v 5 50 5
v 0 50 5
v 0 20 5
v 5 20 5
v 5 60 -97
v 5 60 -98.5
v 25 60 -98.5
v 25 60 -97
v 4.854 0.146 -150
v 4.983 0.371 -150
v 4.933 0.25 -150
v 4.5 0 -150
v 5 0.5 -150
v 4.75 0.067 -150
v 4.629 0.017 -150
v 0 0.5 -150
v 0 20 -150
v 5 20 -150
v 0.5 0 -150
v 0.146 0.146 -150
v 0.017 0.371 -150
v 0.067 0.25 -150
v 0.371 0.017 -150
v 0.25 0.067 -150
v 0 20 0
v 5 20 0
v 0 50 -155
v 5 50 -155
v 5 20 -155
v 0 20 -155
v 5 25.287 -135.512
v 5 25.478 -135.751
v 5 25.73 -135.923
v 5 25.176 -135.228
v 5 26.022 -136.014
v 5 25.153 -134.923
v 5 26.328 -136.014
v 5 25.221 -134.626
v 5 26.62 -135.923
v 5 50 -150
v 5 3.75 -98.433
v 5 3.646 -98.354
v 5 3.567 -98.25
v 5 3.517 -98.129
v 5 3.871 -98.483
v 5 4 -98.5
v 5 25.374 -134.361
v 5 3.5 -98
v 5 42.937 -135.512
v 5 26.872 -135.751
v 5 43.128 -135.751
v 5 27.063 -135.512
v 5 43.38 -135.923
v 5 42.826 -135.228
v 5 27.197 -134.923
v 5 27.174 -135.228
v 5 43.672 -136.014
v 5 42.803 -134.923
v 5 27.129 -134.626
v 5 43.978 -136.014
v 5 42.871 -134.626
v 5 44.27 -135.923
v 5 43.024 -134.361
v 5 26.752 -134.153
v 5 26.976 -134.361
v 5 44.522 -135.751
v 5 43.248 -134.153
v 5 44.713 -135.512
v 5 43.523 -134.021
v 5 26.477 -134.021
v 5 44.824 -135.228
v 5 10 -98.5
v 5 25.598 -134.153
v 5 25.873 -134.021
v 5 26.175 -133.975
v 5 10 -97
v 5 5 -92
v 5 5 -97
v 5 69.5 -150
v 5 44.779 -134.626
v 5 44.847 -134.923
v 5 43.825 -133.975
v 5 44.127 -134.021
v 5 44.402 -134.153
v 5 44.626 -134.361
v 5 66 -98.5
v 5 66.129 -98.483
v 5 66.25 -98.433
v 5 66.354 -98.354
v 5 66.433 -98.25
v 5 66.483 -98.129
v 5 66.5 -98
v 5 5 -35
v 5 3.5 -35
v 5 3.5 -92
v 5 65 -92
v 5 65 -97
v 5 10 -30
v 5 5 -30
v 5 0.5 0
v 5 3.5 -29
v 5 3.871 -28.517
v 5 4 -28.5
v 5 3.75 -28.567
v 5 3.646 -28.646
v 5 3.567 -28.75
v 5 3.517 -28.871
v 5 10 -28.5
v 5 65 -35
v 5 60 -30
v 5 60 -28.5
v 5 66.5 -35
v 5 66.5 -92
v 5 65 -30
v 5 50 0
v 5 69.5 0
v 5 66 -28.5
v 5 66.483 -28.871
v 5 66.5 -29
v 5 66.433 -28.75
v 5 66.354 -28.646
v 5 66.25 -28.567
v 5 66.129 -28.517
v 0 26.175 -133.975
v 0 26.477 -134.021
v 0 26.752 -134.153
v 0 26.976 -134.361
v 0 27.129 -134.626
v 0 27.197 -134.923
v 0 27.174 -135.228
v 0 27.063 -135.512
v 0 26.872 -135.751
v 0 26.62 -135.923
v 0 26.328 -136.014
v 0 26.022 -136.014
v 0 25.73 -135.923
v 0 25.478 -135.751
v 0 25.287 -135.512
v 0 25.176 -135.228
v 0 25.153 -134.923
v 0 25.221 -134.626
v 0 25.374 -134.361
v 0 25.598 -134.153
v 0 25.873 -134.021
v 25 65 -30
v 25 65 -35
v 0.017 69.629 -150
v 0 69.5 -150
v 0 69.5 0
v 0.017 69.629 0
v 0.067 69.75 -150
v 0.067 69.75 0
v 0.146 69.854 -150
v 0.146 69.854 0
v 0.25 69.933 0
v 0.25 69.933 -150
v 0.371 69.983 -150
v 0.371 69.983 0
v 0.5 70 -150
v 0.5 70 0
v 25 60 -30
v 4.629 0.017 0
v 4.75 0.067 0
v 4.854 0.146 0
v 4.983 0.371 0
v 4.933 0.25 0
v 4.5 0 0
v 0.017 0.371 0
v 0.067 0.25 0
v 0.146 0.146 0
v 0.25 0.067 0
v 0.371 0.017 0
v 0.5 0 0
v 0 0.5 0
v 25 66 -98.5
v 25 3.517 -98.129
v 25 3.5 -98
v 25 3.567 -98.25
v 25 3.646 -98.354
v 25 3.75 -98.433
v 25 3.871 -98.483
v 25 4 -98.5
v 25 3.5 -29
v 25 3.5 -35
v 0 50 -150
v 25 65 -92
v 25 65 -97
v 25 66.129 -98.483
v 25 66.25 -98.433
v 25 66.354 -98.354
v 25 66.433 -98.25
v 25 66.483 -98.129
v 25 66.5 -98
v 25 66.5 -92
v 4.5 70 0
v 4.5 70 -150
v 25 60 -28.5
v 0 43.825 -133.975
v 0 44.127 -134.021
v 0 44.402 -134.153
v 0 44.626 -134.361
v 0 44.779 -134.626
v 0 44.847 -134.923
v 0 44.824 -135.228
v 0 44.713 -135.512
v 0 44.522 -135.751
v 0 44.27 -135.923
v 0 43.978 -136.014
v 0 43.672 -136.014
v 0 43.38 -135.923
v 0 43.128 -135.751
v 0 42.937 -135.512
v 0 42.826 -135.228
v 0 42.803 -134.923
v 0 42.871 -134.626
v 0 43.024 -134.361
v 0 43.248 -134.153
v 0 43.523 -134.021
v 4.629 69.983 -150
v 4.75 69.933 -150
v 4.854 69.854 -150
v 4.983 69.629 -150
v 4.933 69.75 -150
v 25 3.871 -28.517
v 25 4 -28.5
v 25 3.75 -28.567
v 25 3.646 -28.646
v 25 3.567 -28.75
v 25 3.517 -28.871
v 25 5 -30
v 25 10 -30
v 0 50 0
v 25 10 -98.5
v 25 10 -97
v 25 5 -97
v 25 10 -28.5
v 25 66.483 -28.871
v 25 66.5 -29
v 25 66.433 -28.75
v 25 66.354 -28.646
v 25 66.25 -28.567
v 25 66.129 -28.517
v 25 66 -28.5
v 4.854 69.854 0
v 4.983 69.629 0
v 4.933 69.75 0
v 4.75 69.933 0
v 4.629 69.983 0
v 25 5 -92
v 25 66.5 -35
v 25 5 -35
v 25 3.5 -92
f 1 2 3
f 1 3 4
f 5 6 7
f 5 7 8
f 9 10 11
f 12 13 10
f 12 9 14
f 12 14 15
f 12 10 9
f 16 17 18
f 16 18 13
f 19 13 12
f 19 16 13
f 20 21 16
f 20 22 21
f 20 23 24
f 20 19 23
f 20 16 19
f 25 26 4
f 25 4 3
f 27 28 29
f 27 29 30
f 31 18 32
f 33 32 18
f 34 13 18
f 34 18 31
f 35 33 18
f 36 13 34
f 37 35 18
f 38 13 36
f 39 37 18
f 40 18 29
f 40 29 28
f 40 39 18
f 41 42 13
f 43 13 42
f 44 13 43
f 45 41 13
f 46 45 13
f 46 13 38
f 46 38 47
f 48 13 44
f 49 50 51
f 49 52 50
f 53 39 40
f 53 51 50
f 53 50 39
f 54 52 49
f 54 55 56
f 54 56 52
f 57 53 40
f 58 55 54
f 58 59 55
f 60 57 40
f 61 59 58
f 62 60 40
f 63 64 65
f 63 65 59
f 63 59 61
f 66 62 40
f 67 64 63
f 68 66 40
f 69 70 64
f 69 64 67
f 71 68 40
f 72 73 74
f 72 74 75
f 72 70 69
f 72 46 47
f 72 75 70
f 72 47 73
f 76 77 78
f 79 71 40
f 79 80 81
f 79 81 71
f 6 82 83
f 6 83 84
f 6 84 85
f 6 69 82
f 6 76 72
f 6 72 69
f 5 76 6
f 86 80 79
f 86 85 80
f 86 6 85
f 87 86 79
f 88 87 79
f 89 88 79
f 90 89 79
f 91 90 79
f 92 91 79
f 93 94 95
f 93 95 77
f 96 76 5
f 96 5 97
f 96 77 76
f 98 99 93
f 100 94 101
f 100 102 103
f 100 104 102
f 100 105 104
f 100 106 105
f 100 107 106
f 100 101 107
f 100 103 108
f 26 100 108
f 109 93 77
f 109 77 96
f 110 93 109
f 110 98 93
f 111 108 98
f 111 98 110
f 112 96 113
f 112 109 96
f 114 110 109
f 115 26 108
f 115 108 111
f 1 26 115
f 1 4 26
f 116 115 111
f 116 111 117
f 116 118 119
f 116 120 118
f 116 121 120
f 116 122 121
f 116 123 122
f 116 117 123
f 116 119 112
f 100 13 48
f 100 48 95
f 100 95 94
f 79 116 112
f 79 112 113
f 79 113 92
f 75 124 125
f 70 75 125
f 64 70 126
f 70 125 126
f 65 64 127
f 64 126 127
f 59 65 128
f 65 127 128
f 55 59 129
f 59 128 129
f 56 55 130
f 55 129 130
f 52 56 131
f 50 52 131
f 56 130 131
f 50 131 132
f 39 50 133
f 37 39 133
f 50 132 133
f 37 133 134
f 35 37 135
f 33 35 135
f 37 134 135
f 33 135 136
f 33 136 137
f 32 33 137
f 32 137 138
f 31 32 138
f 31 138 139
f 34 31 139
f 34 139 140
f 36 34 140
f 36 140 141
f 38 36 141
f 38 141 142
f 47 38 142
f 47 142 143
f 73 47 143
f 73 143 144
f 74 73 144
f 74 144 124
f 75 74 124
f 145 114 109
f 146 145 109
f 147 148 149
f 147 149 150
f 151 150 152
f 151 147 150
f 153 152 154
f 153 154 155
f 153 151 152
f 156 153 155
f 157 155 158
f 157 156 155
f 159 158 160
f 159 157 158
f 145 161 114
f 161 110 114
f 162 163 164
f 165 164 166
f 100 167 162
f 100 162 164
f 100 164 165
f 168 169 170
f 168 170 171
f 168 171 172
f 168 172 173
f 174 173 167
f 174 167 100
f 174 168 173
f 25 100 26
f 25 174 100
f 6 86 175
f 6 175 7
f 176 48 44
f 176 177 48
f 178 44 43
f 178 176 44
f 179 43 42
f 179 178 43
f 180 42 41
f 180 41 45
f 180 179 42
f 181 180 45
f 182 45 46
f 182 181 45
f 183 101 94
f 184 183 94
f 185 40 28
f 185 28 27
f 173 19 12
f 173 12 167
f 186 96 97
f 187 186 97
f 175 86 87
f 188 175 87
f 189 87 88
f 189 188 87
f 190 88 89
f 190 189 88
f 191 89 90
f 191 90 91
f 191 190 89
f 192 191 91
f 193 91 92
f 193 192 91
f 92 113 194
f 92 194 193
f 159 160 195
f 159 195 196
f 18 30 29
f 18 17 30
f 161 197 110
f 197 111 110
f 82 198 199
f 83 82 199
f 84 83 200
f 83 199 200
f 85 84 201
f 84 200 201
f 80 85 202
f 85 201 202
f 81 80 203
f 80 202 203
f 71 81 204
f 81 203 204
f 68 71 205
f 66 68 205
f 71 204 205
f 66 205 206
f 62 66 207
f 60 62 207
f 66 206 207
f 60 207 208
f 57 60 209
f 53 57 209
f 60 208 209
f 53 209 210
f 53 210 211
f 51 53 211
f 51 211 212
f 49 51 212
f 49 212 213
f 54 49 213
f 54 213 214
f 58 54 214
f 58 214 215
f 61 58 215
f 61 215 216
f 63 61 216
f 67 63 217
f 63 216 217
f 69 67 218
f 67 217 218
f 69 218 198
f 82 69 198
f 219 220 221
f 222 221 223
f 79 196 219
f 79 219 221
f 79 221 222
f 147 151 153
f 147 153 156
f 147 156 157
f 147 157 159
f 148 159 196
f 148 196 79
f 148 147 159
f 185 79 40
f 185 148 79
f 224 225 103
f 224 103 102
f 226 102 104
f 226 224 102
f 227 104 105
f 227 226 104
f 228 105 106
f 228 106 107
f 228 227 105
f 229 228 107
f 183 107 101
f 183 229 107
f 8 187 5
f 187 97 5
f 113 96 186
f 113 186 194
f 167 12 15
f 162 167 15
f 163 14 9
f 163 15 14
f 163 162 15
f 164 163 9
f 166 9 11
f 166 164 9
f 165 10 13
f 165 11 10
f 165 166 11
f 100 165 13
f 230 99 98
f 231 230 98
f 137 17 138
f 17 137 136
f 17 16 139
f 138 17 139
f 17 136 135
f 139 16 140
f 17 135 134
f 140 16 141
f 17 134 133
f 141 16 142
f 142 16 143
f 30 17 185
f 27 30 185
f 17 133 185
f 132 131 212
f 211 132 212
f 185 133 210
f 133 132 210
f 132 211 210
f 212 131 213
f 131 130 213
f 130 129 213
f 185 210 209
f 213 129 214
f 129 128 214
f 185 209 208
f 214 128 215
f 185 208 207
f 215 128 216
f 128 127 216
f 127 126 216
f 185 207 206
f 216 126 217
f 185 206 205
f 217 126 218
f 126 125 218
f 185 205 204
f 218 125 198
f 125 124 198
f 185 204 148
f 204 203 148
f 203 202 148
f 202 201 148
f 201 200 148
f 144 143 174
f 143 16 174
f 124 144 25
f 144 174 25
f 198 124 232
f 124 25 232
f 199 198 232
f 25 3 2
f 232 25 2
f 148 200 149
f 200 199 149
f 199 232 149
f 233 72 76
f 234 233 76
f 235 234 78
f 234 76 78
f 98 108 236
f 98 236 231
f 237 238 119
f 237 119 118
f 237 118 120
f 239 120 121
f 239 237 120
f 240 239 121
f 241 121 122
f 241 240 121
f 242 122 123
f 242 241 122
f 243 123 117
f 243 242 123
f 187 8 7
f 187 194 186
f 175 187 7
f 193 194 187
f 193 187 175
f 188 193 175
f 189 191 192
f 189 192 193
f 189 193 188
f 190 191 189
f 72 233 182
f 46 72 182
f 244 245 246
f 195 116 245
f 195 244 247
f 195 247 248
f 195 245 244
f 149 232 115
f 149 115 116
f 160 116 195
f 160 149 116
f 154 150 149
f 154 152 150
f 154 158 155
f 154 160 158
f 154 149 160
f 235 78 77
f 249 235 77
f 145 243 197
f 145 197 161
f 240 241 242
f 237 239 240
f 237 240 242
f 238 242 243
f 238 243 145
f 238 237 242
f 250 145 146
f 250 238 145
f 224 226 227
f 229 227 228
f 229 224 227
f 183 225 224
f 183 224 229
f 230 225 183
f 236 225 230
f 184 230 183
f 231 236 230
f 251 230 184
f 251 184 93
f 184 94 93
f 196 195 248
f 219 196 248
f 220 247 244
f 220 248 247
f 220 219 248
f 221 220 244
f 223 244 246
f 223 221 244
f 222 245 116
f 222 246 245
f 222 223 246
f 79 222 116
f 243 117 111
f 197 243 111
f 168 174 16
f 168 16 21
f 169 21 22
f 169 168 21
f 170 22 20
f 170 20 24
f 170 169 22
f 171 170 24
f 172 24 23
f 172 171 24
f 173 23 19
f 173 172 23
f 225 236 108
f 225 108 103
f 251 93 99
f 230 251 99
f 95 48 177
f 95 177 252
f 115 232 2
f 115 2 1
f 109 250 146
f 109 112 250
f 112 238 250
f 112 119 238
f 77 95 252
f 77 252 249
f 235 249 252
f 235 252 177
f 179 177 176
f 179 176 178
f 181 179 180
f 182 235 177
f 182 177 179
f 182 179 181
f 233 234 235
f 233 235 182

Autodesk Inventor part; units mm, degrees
ref_plane "YZ Plane" through (0, 0, 0) normal (1, 0, 0) x (0, 1, 0)
ref_plane "XZ Plane" through (0, 0, 0) normal (0, 1, 0) x (-1, 0, 0)
ref_plane "XY Plane" through (0, 0, 0) normal (0, 0, 1) x (1, 0, 0)
sketch "Sketch1" plane through (0, 0, 0) normal (1, 0, 0) x (0, 1, 0)
  line L0 (0, 0) -> (70, 0)
  line L1 (70, 0) -> (70, -150)
  line L2 (70, -150) -> (0, -150)
  line L3 (0, -150) -> (0, 0)
  dimension "d0" = 70
  dimension "d1" = 150
extrude "Extrusion1" add sketch "Sketch1" along normal blind 5
sketch "Sketch2" plane through (0, 0, 0) normal (0, 0, 1) x (1, 0, 0)
  line L0 (0, 0) -> (0, 20)
  line L1 (0, 0) -> (0, 70) projected
  line L2 (0, 20) -> (0, 20)
  line L3 (0, 20) -> (0, 50)
  line L4 (0, 50) -> (5, 50)
  line L5 (5, 50) -> (5, 20)
  line L6 (5, 20) -> (0, 20)
  dimension "d4" = 20
  dimension "d5" = 0
  dimension "d6" = 30
  dimension "d7" = 5
extrude "Extrusion2" add sketch "Sketch2" along normal blind 5
sketch "Sketch3" plane through (0, 0, -150) normal (0, 0, -1) x (-1, 0, 0)
  line L0 (0, 0) -> (0, 0)
  line L1 (0, 0) -> (-5, 0) projected
  line L2 (0, 0) -> (0, 20)
  line L3 (0, 20) -> (-5, 20)
  line L4 (-5, 20) -> (-5, 50)
  line L5 (-5, 50) -> (0, 50)
  line L6 (0, 50) -> (0, 20)
  dimension "d10" = 0
  dimension "d11" = 20
  dimension "d12" = 5
  dimension "d13" = 30
extrude "Extrusion3" add sketch "Sketch3" along normal blind 5
sketch "Sketch4" plane through (5, 0, 0) normal (1, 0, 0) x (0, 0, -1)
  line L0 (0, 0) -> (150, 0) projected
  line L1 (0, 0) -> (0, 5)
  line L2 (0, 70) -> (0, 0) projected
  line L3 (0, 5) -> (28.5, 5)
  line L4 (30, 5) -> (30, 65)
  line L5 (30, 65) -> (97, 65)
  line L6 (97, 65) -> (97, 5)
  line L7 (97, 5) -> (30, 5)
  line L8 (30, 65) -> (28.5, 65)
  line L9 (28.5, 65) -> (28.5, 60)
  line L10 (28.5, 60) -> (30, 60)
  line L11 (28.5, 65) -> (28.5, 66.5)
  line L12 (28.5, 66.5) -> (35, 66.5)
  line L13 (35, 66.5) -> (35, 65)
  line L14 (28.5, 5) -> (28.5, 10)
  line L15 (28.5, 10) -> (30, 10)
  line L16 (28.5, 5) -> (28.5, 3.5)
  line L17 (28.5, 3.5) -> (35, 3.5)
  line L18 (35, 3.5) -> (35, 5)
  line L19 (97, 5) -> (98.5, 5)
  line L20 (98.5, 5) -> (98.5, 10)
  line L21 (98.5, 10) -> (97, 10)
  line L22 (98.5, 5) -> (98.5, 3.5)
  line L23 (98.5, 3.5) -> (92, 3.5)
  line L24 (92, 3.5) -> (92, 5)
  line L25 (92, 65) -> (92, 66.5)
  line L26 (92, 66.5) -> (98.5, 66.5)
  line L27 (98.5, 66.5) -> (98.5, 60)
  line L28 (98.5, 60) -> (97, 60)
  dimension "d16" = 5
  dimension "d17" = 30
  dimension "d18" = 60
  dimension "d19" = 67
  dimension "d20" = 1.5
  dimension "d21" = 5
  dimension "d22" = 1.5
  dimension "d23" = 6.5
  dimension "d24" = 5
  dimension "d25" = 1.5
  dimension "d26" = 1.5
  dimension "d27" = 5
  dimension "d28" = 1.5
  dimension "d29" = 6.5
  dimension "d30" = 6.5
  dimension "d31" = 6.5
extrude "Extrusion4" add sketch "Sketch4" along normal blind 20 contours L7 L18 L17 L16 L14 L15 L4 | L10 L9 L8 L4 | L7 L19 L22 L23 L24 | L8 L11 L12 L13 L5 | L6 L21 L20 L19 | L25 L26 L27 L28 L6 L5
fillet "Fillet1" radius 0.5 8 edges at (5, 70, -75) (0, 70, -75) (5, 0, -75) (0, 0, -75) (15, 3.5, -28.5) (15, 66.5, -28.5) (15, 66.5, -98.5) (15, 3.5, -98.5)
sketch "Sketch5" plane through (0, 0, 0) normal (-1, 0, 0) x (0, 0, 1)
  line L0 (-155, 20) -> (-155, 50) projected
  line L1 (-155, 35) -> (-135, 35)
  line L2 (-135, 35) -> (-135, 43.825)
  line L3 (-135, 43.825) -> (-135, 26.175)
  circle A0 centre (-135, 43.825) radius 1.025
  circle A1 centre (-135, 26.175) radius 1.025
  point P0 (0, 0)
  dimension "d35" = 20
  dimension "d36" = 8.825
  dimension "d37" = 17.65
  dimension "d38" = 2.05
  dimension "d39" = 2.05
extrude "Extrusion5" cut sketch "Sketch5" against normal through all
properties part number "Chassis_Upper_Portion"
